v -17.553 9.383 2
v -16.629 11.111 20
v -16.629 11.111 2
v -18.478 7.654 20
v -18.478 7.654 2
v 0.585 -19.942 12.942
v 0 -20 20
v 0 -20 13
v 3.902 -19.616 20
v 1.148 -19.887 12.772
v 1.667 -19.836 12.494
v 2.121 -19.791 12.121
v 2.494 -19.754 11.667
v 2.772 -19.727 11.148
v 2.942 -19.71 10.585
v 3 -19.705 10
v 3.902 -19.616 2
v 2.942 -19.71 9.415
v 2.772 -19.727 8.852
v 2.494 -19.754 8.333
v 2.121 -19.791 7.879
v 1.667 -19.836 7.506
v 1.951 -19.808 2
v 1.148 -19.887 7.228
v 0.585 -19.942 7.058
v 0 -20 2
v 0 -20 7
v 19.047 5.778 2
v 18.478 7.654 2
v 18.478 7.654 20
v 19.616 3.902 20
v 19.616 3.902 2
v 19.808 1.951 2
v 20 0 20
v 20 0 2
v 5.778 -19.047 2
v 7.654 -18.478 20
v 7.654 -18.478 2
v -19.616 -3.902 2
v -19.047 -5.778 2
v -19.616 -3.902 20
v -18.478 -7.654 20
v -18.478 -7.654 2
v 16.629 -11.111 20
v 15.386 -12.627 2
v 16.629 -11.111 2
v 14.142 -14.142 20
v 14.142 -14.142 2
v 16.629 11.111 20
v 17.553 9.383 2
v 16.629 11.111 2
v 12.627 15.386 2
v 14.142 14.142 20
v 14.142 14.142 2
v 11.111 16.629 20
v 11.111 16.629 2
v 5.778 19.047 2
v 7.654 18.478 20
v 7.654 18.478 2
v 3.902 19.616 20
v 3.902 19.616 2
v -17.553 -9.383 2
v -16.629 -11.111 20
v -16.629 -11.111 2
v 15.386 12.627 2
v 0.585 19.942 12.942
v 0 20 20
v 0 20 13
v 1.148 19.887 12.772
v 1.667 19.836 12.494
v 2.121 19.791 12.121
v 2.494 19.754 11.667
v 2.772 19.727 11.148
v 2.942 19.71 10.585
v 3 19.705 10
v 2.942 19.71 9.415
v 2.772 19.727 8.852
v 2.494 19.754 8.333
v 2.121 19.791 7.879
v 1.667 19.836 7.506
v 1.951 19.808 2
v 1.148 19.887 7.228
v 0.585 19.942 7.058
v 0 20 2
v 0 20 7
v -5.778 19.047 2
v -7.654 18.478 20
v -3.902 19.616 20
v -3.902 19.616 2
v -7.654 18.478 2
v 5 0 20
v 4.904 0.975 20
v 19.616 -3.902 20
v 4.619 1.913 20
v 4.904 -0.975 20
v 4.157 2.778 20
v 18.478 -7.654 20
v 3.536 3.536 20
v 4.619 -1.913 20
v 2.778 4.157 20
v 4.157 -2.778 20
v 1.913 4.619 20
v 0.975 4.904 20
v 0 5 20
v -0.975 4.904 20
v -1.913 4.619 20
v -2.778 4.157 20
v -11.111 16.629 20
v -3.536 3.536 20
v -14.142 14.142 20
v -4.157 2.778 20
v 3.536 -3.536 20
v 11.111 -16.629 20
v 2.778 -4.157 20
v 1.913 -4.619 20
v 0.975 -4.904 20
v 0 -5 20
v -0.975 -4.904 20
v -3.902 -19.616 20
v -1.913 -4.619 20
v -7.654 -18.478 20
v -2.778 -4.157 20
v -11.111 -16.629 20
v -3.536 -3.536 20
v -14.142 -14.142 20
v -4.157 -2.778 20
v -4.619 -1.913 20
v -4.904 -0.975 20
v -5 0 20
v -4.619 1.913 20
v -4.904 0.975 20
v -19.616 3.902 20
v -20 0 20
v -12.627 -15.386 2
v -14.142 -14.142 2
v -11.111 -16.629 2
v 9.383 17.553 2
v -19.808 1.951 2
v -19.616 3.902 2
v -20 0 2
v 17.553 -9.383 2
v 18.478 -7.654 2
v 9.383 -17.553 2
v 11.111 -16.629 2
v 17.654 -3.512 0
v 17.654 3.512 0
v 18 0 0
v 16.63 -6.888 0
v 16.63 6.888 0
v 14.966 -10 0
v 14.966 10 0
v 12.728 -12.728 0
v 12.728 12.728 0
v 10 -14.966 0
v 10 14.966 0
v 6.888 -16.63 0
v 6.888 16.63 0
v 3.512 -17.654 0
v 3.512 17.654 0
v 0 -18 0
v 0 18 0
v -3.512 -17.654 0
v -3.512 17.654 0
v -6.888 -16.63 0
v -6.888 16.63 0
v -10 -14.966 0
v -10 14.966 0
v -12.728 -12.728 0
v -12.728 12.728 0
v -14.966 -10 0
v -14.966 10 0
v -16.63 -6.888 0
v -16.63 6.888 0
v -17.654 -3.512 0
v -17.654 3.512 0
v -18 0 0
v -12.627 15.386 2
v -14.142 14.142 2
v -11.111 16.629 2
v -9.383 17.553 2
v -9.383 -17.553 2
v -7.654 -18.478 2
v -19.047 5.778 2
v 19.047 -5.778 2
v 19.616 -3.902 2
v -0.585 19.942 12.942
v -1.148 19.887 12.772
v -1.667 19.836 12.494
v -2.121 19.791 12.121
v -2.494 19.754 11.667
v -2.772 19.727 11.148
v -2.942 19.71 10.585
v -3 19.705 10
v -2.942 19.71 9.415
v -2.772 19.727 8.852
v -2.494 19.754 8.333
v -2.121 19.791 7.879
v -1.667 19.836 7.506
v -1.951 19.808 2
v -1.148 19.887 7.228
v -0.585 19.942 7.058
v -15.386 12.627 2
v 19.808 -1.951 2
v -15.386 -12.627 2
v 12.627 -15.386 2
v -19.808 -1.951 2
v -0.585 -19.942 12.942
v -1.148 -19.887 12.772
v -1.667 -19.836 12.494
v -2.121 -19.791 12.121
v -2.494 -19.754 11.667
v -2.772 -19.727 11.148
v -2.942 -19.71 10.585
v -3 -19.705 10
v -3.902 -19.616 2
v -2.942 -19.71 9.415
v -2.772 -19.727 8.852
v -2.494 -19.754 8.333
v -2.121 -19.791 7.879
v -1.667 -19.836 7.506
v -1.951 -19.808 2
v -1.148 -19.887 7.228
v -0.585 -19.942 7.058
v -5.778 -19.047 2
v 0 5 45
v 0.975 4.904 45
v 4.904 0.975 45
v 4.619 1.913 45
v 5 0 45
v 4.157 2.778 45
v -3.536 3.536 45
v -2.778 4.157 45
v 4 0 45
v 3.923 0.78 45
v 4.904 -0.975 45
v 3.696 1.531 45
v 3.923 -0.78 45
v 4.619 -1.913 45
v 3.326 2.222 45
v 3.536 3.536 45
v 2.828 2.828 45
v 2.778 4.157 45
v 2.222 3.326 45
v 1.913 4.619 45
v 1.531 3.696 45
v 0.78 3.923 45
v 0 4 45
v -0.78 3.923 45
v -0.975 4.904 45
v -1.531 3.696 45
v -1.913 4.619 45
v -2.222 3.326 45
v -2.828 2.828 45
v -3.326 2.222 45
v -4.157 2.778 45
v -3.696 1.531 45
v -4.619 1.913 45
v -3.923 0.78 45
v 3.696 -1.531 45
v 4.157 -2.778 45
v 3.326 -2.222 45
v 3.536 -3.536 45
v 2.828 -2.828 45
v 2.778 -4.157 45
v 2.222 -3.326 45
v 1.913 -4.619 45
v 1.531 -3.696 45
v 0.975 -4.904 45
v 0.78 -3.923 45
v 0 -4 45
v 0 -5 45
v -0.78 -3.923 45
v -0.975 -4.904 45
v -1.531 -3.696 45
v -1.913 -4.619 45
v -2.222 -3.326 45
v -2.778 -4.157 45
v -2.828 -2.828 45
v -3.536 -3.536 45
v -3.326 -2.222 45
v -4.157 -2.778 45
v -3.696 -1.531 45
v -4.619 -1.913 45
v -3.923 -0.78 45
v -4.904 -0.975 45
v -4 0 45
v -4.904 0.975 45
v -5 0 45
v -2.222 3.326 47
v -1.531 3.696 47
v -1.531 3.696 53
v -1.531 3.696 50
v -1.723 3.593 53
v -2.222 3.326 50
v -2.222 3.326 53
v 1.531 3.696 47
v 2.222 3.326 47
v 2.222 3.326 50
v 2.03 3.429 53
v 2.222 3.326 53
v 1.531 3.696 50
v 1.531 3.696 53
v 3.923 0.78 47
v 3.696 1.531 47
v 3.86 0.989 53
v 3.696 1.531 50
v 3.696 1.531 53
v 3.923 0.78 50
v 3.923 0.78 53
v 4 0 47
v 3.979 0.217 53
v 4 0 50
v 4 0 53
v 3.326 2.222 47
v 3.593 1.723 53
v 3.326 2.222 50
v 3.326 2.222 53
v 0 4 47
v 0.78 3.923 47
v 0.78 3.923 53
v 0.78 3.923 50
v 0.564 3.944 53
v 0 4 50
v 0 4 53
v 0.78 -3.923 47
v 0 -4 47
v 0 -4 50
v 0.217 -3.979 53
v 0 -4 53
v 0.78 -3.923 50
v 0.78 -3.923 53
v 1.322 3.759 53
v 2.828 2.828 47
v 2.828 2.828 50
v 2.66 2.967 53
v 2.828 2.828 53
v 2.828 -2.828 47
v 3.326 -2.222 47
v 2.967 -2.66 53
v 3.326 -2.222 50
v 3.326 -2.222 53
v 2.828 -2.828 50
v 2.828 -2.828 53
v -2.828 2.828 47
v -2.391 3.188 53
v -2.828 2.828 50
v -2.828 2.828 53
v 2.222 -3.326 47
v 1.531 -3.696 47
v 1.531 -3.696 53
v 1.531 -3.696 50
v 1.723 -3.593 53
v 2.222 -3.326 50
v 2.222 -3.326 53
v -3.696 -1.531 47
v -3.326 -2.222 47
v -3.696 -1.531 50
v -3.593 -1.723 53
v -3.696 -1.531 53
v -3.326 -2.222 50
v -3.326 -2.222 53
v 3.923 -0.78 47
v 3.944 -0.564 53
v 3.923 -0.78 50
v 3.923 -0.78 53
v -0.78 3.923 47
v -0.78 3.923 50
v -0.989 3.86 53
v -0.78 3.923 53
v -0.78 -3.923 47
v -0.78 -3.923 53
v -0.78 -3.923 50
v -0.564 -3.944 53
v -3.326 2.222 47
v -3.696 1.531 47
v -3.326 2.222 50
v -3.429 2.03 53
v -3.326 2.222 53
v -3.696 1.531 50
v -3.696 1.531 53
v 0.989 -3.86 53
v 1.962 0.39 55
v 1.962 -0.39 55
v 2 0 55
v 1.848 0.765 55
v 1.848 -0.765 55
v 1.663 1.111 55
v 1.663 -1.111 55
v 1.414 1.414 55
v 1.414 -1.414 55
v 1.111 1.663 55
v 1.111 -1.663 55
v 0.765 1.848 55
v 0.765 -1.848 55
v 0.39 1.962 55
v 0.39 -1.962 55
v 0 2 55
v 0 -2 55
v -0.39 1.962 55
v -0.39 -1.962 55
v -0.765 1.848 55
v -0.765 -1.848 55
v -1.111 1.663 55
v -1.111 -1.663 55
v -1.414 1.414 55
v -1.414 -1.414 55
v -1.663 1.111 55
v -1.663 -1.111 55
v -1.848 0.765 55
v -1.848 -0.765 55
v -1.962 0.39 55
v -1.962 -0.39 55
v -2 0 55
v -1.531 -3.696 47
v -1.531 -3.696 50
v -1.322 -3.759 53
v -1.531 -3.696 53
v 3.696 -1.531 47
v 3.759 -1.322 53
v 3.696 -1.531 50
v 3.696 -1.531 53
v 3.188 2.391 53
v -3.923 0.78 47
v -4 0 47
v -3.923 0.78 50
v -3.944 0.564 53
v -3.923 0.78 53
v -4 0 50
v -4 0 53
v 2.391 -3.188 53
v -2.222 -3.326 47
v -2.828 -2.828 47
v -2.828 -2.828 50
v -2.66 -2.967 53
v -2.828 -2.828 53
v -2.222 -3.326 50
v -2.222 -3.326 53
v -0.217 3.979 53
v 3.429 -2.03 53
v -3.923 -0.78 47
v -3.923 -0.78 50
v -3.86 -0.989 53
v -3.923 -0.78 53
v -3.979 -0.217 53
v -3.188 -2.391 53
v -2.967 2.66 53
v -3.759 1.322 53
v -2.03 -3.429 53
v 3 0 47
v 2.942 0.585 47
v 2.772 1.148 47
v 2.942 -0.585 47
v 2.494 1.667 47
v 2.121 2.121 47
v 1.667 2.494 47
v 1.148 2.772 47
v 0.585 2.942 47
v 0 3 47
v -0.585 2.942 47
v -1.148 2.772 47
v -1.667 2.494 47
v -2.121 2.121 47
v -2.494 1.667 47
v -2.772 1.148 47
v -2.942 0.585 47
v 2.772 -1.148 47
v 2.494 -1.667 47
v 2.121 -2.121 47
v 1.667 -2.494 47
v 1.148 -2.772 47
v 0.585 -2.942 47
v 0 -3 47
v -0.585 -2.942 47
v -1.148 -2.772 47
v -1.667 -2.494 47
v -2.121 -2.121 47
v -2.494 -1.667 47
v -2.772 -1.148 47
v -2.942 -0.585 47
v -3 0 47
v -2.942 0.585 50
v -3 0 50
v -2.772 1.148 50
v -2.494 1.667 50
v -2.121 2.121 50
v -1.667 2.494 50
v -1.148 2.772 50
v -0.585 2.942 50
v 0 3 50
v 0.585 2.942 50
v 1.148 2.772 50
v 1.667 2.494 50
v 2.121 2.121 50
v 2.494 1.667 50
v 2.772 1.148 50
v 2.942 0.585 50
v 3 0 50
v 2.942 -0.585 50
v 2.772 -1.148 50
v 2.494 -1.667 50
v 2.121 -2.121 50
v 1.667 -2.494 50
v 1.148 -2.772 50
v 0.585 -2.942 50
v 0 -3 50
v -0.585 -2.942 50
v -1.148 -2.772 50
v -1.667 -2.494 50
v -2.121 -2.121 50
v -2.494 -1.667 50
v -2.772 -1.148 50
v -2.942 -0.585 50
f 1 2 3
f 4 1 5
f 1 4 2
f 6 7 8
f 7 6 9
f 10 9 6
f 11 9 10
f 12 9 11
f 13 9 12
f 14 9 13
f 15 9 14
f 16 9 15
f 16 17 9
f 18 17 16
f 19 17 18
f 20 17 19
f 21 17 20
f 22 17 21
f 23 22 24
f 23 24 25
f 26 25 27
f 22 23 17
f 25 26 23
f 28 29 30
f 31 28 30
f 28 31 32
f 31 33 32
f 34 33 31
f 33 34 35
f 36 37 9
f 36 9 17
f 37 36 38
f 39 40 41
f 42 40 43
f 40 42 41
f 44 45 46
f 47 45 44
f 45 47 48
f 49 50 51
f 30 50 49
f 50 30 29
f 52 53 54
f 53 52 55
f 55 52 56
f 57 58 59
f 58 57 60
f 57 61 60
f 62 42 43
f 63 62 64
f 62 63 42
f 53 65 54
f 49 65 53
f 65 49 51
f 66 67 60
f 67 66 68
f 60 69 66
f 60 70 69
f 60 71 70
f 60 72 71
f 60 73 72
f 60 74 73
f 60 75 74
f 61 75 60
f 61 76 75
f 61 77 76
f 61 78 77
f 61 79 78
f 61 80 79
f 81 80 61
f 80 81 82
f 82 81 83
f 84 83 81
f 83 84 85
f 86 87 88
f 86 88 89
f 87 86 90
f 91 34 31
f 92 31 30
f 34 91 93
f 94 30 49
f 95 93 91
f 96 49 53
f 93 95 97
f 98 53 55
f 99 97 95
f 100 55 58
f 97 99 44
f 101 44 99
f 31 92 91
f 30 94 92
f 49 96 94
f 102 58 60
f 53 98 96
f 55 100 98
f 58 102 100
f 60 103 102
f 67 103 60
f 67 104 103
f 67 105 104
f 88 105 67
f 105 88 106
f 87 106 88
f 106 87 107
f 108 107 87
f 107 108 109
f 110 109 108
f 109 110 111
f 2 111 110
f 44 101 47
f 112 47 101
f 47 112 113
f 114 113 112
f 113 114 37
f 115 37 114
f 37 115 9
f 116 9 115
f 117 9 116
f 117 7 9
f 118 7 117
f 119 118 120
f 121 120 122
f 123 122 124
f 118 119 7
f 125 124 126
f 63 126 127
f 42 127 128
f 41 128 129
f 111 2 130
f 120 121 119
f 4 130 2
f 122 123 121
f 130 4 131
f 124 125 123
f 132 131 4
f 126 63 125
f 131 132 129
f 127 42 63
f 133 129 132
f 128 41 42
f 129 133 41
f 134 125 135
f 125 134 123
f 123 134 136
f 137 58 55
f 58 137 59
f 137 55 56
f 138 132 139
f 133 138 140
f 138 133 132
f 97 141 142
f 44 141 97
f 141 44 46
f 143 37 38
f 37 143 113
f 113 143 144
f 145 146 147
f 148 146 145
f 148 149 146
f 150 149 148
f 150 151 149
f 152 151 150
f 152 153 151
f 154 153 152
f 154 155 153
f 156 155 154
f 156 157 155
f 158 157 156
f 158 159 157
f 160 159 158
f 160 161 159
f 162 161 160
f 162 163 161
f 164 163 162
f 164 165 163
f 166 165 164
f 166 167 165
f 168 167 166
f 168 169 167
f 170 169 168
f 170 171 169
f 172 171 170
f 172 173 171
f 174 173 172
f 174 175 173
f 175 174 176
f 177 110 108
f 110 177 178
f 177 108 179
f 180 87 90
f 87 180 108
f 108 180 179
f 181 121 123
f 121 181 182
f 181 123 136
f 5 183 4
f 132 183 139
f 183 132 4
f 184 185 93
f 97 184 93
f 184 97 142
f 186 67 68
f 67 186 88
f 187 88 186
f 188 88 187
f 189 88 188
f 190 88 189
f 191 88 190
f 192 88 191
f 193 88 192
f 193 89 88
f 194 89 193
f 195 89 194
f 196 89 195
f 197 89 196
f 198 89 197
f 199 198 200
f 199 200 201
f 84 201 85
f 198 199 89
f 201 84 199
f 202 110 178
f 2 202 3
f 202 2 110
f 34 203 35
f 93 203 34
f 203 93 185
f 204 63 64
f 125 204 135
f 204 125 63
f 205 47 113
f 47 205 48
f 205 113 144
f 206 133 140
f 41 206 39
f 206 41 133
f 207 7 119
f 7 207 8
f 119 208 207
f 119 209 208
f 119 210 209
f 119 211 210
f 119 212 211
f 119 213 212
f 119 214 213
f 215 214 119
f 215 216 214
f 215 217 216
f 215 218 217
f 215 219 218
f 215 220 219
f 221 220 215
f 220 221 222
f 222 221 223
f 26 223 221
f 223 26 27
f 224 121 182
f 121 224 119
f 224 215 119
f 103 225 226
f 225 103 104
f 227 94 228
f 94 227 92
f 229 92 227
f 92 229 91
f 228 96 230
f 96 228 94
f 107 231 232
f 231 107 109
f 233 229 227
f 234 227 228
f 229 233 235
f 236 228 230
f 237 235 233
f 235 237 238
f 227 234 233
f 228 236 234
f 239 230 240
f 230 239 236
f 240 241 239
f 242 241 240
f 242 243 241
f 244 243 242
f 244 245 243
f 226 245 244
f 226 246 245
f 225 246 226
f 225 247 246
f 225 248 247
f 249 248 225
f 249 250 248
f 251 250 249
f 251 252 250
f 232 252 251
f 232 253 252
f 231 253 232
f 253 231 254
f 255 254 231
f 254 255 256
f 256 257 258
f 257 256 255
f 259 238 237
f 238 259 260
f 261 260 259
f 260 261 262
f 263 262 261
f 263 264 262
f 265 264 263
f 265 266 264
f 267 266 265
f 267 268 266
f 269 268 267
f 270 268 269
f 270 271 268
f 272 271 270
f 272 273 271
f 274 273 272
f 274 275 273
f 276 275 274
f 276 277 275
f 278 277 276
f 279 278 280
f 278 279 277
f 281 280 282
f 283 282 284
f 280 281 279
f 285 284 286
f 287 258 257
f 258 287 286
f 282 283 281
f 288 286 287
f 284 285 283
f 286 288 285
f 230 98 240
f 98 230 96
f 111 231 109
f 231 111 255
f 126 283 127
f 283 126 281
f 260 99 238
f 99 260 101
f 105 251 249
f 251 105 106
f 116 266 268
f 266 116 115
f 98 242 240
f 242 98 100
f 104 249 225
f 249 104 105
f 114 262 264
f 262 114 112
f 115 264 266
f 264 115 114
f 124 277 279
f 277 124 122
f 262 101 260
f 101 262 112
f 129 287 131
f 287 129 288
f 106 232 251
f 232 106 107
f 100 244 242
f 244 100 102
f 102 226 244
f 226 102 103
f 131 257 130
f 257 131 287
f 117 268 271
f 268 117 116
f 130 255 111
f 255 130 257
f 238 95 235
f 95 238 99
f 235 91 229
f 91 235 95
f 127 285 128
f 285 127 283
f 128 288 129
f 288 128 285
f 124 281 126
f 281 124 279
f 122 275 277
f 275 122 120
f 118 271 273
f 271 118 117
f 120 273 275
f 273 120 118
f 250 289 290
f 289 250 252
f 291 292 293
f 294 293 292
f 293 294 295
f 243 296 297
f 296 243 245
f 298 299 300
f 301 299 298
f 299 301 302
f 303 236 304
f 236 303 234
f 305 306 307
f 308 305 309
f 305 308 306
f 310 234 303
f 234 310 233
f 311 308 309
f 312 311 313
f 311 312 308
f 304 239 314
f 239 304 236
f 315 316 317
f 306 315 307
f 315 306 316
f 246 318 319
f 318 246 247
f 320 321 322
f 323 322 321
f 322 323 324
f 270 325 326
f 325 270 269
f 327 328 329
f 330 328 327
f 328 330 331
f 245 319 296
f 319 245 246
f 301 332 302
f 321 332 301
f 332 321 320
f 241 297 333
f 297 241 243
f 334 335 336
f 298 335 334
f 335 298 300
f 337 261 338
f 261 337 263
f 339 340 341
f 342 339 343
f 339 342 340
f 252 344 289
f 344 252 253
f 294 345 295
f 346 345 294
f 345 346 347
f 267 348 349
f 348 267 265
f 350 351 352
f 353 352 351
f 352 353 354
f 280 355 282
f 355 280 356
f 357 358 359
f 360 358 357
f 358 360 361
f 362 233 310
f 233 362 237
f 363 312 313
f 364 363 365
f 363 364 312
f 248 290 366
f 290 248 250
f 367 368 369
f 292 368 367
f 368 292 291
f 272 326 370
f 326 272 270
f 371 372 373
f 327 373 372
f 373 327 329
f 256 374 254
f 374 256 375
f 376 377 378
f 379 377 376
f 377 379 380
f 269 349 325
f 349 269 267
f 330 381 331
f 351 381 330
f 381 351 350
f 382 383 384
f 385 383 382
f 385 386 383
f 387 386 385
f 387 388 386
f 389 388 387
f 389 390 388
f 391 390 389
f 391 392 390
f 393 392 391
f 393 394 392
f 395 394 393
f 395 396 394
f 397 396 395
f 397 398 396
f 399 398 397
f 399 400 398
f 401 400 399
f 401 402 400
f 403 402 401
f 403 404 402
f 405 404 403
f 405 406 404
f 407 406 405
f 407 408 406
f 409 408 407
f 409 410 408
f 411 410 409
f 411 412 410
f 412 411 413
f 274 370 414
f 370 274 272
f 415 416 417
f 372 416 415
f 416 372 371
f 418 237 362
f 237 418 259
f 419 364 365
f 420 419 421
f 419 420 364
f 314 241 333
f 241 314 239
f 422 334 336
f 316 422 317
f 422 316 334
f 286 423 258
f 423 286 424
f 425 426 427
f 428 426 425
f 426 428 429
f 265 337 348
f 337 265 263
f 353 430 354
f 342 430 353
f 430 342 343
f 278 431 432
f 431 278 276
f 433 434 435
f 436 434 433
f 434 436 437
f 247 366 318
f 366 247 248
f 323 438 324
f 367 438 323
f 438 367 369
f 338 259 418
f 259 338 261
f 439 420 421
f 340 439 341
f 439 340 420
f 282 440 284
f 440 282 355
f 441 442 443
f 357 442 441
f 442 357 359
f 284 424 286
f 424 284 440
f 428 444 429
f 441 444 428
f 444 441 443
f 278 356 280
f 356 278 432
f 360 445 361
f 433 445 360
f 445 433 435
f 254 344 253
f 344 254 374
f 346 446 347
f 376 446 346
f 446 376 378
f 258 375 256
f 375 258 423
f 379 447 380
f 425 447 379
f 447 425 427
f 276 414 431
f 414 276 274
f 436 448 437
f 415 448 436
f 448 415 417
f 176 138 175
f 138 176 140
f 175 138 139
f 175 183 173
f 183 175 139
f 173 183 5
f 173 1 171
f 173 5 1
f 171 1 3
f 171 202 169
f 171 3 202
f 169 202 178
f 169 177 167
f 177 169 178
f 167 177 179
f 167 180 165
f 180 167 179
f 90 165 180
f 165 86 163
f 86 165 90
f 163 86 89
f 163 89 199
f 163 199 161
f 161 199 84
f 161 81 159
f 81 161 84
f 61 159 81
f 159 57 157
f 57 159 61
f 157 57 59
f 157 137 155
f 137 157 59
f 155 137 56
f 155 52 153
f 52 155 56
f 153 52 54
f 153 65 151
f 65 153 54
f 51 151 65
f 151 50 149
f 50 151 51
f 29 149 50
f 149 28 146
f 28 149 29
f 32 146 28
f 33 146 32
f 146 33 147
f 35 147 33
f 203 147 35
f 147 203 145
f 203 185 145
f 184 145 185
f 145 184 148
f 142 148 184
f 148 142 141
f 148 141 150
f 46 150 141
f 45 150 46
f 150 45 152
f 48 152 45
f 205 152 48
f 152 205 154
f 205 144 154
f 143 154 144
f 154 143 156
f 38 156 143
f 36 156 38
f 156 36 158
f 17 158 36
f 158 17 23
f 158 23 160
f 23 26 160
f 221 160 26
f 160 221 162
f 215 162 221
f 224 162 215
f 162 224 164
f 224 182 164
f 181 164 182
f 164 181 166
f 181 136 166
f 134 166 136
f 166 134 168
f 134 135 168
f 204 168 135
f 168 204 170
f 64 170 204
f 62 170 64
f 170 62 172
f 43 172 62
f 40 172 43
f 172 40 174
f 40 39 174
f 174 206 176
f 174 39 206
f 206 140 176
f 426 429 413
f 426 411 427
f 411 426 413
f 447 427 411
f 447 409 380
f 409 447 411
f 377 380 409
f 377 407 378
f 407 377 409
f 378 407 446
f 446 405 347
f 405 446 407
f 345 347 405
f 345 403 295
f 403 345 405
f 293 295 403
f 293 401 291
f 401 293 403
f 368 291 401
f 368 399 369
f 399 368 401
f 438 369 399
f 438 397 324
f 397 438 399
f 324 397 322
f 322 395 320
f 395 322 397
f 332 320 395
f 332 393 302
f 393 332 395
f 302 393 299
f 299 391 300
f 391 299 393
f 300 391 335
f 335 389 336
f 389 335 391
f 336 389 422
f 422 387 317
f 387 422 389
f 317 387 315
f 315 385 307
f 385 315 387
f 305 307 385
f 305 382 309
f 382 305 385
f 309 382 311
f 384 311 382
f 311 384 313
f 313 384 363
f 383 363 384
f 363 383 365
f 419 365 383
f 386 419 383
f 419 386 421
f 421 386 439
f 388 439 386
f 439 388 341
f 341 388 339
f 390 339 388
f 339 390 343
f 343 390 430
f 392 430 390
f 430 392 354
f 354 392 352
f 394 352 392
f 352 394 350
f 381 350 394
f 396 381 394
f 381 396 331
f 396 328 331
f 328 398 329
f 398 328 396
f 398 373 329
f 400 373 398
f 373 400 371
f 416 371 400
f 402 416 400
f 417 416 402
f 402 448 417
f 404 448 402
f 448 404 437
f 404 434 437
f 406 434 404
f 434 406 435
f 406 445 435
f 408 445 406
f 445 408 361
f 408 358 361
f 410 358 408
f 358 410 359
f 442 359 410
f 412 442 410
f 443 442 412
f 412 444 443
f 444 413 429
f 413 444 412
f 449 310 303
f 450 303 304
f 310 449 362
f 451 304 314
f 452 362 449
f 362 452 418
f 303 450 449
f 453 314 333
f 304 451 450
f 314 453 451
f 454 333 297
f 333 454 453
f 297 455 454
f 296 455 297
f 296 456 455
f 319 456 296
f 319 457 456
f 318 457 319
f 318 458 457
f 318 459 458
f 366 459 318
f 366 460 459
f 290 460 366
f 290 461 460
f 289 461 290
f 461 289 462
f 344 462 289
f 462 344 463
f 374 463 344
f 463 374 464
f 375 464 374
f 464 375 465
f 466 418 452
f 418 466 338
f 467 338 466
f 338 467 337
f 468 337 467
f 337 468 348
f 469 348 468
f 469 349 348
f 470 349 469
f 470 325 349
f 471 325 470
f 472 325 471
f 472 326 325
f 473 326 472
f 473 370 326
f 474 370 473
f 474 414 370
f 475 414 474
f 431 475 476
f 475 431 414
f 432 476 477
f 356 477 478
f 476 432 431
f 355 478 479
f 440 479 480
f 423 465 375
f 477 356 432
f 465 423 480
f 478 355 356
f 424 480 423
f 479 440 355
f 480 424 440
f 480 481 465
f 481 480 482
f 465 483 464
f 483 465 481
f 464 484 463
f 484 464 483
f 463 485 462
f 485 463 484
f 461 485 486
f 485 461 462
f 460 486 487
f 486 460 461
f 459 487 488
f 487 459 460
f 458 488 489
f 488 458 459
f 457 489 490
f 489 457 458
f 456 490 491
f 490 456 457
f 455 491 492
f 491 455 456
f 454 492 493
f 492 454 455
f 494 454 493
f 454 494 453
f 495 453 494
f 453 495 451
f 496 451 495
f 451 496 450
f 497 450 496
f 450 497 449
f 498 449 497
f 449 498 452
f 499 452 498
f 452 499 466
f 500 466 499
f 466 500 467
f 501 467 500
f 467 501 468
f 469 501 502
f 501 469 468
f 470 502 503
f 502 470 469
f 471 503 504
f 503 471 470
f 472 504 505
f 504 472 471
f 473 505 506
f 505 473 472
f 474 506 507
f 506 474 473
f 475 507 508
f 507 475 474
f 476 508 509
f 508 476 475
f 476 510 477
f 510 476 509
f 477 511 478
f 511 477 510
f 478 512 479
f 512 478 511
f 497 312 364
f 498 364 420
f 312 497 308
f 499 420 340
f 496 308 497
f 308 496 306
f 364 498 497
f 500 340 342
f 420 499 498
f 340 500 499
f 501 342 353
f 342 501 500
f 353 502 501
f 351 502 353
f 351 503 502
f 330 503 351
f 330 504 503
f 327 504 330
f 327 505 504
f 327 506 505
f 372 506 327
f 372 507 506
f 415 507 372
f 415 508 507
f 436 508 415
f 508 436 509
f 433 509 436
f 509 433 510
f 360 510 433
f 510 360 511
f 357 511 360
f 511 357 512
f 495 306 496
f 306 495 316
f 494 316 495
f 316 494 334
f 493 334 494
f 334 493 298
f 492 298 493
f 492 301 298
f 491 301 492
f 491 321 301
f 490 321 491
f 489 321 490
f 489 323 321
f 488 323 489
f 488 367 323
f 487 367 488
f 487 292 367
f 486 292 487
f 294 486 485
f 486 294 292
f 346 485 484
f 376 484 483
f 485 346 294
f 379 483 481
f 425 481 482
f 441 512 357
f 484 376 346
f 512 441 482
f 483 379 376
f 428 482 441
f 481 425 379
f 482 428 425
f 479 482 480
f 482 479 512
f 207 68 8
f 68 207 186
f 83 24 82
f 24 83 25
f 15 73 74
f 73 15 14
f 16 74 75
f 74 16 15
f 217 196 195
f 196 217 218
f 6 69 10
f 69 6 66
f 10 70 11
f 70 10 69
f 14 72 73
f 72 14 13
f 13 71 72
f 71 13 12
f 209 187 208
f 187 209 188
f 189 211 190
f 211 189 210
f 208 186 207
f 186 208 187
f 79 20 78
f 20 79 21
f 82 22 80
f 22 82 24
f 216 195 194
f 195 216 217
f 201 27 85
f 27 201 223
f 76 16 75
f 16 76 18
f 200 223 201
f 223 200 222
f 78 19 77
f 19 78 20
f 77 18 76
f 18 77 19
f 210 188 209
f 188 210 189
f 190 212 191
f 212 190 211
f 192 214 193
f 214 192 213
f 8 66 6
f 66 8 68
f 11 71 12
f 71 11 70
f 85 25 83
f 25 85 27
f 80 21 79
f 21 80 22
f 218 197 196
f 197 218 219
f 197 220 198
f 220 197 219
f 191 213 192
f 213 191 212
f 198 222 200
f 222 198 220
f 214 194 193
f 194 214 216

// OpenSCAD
$fn = 32;

// ----------------------------------------------------------------------
// Stepped shaft: diameters 40, 10, 8 mm, 55 mm long
// ----------------------------------------------------------------------

// --- parameters (mm) ---
d1 = 40;                  // step 1 diameter
len1 = 20;                // step 1 length
d2 = 10;                  // step 2 diameter
len2 = 25;                // step 2 length
d3 = 8;                   // step 3 diameter
len3 = 10;                // step 3 length
total = 55;               // overall length
chamfer = 2;              // end chamfer
groove_r = 4;             // groove radius
groove_z = 47;            // groove position from the end
groove_w = 3;             // groove width
groove_d = 1;             // groove depth
cross_d = 6;              // cross pin hole
cross_z = 10;             // cross hole position

difference() {
  /* turned body: stacked cylinders, every step sunk into the bigger one */
  union() {
    cylinder(h = len1, d = d1);
    translate([0, 0, 19.6]) cylinder(h = 25.4, d = d2);
    translate([0, 0, 44.6]) cylinder(h = 10.4, d = d3);
  }
  /* bottom chamfer ring cut */
  rotate_extrude() translate([18, -2.5]) polygon([[0, 0], [4.5, 0], [4.5, 7], [0, 2.5]]);
  /* top chamfer ring cut */
  rotate_extrude() translate([2, 55]) polygon([[0, 0], [4.5, -4.5], [4.5, 2.5], [0, 2.5]]);
  /* circlip groove just behind the shoulder */
  rotate_extrude() translate([groove_r - groove_d, groove_z]) square([groove_d + 2.5, groove_w]);
  /* cross pin hole through the small step */
  translate([0, 0, cross_z]) rotate([90, 0, 0]) cylinder(h = d1 + 5, d = cross_d, center = true);
}
